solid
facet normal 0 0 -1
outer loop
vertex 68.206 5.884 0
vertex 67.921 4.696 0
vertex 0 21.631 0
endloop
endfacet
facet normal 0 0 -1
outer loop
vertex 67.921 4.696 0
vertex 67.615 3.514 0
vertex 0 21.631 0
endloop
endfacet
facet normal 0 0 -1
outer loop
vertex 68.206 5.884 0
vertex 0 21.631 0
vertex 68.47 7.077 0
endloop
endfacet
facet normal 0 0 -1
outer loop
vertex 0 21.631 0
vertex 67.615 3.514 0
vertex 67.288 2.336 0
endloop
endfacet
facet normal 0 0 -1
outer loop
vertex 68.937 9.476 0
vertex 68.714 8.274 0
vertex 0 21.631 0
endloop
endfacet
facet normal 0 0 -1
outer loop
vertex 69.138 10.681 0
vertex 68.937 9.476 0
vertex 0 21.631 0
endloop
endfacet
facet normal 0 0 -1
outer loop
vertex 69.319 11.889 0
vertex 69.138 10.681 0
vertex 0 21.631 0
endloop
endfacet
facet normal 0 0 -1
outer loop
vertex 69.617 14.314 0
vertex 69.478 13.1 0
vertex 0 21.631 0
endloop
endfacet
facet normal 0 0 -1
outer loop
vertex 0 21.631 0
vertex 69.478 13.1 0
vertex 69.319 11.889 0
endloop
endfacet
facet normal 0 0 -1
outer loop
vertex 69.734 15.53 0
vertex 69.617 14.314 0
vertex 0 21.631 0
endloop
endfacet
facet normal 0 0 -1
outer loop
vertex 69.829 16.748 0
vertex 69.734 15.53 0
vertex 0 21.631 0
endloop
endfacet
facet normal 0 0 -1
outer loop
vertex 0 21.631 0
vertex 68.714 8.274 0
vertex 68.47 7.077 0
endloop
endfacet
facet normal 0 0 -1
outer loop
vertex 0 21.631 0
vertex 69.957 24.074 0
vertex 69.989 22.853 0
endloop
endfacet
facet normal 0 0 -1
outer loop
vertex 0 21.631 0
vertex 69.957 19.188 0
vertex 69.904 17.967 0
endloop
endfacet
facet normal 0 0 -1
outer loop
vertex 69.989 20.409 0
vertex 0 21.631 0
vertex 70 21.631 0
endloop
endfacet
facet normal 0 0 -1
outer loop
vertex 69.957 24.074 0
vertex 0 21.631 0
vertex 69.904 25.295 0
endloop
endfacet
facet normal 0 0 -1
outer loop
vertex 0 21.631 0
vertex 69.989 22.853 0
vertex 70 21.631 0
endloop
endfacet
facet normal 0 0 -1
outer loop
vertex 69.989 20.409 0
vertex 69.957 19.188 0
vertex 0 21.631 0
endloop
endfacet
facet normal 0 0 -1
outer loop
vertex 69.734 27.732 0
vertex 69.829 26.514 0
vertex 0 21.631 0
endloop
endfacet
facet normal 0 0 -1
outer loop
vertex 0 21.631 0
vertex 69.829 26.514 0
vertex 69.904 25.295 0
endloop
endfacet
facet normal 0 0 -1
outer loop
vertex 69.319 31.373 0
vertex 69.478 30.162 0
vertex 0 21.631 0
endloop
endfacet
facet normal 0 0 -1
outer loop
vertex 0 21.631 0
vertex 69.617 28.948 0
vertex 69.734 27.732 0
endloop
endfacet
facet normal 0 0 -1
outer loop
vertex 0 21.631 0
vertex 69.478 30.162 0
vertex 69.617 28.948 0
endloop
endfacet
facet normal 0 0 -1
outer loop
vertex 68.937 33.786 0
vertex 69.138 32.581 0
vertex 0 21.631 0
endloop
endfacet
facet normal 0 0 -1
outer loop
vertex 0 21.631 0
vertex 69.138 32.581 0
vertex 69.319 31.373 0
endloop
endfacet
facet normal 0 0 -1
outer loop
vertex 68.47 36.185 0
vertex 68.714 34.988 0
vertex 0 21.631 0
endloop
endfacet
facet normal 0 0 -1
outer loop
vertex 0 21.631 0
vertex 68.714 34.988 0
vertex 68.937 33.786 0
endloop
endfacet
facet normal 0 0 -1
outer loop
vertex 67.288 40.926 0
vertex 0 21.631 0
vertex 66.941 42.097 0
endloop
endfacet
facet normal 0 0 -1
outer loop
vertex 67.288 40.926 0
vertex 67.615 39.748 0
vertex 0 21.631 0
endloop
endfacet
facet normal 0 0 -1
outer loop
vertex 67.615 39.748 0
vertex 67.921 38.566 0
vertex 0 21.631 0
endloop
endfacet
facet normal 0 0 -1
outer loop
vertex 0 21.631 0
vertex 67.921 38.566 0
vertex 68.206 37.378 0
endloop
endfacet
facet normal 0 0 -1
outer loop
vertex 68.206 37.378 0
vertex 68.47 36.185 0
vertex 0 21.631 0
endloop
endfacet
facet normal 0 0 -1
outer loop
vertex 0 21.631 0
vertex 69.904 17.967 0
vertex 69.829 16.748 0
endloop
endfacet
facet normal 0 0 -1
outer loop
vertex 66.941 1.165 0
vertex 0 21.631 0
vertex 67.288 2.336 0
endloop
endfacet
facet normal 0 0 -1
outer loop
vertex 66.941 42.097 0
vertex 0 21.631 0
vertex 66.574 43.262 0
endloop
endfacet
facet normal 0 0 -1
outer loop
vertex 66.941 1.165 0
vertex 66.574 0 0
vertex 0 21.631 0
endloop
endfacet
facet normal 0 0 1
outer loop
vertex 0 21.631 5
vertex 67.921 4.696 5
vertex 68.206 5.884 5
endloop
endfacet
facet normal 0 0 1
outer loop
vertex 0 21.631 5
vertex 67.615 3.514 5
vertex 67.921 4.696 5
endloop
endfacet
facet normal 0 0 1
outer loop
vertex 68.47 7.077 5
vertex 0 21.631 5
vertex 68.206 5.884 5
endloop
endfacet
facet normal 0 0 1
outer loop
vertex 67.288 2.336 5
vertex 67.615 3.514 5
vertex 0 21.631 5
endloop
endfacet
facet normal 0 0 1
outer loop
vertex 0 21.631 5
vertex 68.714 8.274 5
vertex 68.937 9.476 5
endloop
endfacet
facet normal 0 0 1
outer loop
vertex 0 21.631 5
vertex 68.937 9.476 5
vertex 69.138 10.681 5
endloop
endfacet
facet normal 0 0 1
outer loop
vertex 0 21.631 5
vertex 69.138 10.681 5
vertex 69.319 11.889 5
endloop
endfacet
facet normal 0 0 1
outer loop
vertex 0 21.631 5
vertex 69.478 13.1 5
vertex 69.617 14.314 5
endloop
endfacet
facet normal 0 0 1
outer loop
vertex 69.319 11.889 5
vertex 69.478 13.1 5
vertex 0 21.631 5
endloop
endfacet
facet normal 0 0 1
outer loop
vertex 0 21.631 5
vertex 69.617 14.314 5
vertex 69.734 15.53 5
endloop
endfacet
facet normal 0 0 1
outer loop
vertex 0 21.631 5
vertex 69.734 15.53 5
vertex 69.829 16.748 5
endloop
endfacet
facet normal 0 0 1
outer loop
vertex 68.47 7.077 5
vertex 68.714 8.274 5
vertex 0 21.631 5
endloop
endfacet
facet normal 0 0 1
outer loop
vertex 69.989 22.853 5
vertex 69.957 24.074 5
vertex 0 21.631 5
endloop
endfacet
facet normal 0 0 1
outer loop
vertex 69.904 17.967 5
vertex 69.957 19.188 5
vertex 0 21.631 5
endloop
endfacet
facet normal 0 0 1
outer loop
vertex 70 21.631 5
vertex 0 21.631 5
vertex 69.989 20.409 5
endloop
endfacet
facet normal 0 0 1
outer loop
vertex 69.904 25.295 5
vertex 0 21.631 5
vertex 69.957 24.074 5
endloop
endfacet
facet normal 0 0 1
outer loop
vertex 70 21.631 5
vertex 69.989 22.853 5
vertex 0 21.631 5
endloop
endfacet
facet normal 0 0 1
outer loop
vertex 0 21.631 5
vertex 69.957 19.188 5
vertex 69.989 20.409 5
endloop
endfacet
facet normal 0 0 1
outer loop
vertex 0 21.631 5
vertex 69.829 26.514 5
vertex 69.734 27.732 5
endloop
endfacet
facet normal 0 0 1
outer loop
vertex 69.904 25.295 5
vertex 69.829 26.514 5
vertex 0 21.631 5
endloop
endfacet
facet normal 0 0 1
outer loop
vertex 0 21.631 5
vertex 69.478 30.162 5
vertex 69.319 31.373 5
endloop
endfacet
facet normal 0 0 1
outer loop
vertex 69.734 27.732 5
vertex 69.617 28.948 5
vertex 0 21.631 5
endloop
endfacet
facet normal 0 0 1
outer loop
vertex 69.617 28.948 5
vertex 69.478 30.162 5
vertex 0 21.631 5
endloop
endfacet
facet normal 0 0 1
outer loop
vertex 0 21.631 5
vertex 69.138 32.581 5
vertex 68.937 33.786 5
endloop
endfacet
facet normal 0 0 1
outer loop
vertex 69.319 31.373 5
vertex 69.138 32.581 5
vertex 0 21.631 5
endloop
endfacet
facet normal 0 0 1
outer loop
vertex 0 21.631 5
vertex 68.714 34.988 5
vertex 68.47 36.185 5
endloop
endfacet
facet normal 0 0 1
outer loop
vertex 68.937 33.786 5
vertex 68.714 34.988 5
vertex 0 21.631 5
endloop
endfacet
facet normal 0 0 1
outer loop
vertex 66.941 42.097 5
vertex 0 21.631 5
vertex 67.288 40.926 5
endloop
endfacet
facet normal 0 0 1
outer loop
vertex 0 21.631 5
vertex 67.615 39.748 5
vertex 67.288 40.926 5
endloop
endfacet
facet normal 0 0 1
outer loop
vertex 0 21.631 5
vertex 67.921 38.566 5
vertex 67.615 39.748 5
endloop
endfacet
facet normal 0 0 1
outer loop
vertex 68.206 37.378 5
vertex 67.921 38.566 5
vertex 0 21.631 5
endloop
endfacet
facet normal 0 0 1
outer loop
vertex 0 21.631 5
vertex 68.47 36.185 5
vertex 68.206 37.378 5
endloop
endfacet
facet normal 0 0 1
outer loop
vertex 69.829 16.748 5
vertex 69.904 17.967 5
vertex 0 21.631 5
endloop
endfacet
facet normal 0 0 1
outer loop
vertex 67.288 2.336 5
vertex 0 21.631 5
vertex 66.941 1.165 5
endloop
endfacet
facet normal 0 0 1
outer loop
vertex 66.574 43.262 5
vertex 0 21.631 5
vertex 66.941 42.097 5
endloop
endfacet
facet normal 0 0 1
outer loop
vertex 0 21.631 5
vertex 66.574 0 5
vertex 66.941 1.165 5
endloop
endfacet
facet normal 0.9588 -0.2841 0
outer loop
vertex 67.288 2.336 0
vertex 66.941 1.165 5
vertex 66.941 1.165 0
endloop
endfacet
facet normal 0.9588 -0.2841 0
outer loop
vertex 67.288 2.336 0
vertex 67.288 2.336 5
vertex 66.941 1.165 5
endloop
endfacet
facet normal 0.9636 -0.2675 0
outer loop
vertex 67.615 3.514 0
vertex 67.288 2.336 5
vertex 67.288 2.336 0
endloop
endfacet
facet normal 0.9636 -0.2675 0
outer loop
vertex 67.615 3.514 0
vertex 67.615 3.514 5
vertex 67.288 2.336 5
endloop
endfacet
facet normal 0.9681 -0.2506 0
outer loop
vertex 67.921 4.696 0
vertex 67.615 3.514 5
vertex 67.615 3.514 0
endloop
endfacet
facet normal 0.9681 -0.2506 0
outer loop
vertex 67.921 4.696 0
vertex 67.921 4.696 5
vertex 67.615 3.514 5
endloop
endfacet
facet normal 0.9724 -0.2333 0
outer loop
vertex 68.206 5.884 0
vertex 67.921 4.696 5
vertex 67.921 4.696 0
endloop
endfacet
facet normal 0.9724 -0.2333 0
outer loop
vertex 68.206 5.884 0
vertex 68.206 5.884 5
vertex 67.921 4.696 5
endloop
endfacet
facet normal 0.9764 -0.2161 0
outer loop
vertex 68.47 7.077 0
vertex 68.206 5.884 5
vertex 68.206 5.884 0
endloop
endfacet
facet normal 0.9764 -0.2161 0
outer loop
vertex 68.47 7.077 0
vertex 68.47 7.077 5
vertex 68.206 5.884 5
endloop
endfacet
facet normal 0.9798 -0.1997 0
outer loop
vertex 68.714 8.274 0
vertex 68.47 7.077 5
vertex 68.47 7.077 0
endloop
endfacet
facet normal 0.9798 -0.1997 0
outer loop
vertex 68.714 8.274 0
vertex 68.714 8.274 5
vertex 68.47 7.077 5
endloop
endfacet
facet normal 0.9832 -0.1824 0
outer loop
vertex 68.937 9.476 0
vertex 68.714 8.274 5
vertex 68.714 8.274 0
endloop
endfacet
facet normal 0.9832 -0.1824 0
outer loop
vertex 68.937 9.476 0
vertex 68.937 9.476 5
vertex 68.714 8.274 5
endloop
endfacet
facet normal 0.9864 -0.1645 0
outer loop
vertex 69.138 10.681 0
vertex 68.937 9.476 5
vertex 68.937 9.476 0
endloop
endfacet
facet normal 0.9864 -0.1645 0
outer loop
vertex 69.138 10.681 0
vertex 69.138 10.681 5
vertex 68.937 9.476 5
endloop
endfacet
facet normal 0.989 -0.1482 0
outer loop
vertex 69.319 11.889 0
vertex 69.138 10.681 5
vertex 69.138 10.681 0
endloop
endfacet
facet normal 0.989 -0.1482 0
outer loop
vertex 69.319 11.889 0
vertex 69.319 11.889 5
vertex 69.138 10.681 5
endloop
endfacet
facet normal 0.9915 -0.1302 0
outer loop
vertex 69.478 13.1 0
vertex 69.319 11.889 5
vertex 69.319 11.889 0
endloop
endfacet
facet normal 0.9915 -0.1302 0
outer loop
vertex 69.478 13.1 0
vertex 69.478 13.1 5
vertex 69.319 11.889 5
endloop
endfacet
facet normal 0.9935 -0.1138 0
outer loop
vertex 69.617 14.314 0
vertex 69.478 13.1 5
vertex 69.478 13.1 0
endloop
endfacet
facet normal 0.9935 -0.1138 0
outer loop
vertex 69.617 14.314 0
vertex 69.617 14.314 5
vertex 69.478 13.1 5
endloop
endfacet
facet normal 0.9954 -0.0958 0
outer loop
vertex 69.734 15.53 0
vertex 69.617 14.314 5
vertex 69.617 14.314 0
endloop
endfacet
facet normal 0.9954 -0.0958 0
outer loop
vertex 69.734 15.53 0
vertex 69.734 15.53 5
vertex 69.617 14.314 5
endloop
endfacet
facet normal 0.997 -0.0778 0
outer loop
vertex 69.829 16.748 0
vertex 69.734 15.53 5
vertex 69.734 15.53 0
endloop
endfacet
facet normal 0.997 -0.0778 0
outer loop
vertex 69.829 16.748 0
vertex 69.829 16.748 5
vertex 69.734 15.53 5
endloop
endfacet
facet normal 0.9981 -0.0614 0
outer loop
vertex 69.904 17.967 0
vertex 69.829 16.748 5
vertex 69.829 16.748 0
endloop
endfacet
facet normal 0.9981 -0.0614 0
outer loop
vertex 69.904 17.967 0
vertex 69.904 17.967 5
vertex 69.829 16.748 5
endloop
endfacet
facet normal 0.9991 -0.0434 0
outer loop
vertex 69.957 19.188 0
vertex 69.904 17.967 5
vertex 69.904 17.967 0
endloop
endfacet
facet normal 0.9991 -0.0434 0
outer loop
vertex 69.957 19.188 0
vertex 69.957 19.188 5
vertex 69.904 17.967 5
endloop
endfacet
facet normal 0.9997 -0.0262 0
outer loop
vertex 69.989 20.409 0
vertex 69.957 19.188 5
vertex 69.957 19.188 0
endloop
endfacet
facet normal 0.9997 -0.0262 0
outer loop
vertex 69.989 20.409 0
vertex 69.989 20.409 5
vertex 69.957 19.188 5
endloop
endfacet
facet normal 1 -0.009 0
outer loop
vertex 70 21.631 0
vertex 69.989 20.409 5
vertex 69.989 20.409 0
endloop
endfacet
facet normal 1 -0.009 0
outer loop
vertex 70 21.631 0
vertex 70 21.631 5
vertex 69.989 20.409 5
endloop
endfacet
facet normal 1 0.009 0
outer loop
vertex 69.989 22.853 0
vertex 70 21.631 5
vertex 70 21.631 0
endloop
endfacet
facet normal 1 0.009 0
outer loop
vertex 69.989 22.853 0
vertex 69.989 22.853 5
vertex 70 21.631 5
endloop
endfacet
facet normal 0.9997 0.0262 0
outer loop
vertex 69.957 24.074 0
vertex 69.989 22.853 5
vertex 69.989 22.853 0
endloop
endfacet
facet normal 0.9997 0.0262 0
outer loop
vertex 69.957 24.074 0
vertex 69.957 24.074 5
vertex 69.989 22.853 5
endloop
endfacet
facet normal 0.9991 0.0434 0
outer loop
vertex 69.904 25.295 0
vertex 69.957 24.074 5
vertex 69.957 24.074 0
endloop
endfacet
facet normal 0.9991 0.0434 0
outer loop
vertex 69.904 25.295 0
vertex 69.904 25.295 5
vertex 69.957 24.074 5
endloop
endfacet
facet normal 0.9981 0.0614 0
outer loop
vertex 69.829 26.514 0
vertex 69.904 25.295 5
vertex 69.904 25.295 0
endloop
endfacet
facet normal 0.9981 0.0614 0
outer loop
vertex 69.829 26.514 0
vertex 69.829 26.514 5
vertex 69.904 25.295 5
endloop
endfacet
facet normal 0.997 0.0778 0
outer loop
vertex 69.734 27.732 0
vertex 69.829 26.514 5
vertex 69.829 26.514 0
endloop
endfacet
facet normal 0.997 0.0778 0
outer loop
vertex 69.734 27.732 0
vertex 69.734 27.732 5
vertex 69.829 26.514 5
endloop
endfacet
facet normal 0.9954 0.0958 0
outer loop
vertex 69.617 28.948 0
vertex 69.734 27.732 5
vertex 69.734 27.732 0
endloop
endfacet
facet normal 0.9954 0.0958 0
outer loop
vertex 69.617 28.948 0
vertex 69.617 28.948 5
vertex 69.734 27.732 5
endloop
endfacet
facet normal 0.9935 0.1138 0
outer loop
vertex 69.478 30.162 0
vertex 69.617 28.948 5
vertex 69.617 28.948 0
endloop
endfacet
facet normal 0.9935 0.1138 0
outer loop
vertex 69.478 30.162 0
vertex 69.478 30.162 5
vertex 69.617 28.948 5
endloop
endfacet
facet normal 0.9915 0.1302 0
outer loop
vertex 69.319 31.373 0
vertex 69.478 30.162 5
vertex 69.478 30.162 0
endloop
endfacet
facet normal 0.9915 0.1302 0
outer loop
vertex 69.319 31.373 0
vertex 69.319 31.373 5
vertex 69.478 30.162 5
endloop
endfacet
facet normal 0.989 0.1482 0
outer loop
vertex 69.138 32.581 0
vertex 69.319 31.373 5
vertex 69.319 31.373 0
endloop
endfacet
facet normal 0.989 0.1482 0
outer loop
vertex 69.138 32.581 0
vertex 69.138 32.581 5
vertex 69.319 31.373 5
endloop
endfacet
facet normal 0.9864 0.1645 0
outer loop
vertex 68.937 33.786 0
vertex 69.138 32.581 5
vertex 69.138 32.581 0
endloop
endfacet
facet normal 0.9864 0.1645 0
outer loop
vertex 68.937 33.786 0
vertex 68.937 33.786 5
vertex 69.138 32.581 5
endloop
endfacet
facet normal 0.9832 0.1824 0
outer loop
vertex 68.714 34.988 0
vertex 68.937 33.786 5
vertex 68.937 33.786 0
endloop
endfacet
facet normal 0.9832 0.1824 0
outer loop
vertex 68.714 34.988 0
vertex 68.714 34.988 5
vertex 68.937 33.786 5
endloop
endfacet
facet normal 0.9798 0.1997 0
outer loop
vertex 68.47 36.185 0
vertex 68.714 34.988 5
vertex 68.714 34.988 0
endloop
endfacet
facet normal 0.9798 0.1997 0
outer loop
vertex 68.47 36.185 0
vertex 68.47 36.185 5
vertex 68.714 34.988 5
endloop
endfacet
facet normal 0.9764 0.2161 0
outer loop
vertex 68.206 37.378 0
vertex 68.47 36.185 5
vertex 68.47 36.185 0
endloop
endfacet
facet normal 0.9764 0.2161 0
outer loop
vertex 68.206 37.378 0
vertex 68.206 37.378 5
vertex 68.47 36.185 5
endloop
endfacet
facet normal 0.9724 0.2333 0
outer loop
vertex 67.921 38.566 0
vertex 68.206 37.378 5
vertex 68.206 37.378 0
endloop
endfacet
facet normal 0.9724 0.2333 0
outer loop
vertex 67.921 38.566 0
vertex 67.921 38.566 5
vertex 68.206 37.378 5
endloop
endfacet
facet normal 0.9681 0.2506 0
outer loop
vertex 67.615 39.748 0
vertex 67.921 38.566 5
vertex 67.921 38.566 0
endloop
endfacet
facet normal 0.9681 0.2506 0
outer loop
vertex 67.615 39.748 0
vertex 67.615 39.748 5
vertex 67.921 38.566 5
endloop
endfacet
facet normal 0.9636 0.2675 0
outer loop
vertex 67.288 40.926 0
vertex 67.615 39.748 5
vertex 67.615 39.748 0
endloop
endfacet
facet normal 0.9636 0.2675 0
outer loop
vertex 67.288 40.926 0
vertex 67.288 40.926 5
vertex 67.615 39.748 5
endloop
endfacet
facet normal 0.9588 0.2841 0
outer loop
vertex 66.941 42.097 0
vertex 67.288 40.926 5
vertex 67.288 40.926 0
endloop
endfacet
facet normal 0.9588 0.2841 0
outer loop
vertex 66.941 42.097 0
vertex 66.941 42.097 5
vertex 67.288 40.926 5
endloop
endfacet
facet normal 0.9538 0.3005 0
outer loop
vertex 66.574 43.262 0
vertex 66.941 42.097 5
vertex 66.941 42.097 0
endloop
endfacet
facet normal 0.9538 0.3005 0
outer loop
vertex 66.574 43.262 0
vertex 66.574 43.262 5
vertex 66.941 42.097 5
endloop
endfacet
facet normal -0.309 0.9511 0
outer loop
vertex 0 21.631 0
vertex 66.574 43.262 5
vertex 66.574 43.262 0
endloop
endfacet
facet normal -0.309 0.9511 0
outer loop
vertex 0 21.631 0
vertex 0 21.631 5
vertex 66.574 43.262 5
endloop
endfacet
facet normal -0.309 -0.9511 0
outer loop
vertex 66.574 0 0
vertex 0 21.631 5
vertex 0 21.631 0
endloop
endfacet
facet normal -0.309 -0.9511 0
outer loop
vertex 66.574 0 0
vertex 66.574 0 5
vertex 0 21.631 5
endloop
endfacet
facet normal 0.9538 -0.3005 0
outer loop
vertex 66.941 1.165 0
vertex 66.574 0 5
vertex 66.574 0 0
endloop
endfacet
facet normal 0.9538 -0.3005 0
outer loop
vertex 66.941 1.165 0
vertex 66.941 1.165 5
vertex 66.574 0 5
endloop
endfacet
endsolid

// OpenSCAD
$fn = 32;

// ----------------------------------------------------------------------
// Arc profile plate: sector, 38 points
// ----------------------------------------------------------------------

// --- parameters (mm) ---
sector_angle = 36;        // sector angle, degrees
sector_r = 70;            // outer radius
arc_step = 1;             // sampling step of the arc, degrees
plate_t = 5;              // plate thickness, Z

bbox_x = 2 * sector_r * sin(sector_angle / 2);  // chord of the sector
bbox_y = sector_r;  // depth of the sector (apex to arc)

profile = [[66.574, 0], [66.941, 1.165], [67.288, 2.336], [67.615, 3.514], [67.921, 4.696], [68.206, 5.884], [68.47, 7.077], [68.714, 8.274], [68.937, 9.476], [69.138, 10.681], [69.319, 11.889], [69.478, 13.1], [69.617, 14.314], [69.734, 15.53], [69.829, 16.748], [69.904, 17.967], [69.957, 19.188], [69.989, 20.409], [70, 21.631], [69.989, 22.853], [69.957, 24.074], [69.904, 25.295], [69.829, 26.514], [69.734, 27.732], [69.617, 28.948], [69.478, 30.162], [69.319, 31.373], [69.138, 32.581], [68.937, 33.786], [68.714, 34.988], [68.47, 36.185], [68.206, 37.378], [67.921, 38.566], [67.615, 39.748], [67.288, 40.926], [66.941, 42.097], [66.574, 43.262], [0, 21.631]];  // primary outline, 38 points, counter clockwise

// --- the one profile operation ---
linear_extrude(height = plate_t) polygon(points = profile);
